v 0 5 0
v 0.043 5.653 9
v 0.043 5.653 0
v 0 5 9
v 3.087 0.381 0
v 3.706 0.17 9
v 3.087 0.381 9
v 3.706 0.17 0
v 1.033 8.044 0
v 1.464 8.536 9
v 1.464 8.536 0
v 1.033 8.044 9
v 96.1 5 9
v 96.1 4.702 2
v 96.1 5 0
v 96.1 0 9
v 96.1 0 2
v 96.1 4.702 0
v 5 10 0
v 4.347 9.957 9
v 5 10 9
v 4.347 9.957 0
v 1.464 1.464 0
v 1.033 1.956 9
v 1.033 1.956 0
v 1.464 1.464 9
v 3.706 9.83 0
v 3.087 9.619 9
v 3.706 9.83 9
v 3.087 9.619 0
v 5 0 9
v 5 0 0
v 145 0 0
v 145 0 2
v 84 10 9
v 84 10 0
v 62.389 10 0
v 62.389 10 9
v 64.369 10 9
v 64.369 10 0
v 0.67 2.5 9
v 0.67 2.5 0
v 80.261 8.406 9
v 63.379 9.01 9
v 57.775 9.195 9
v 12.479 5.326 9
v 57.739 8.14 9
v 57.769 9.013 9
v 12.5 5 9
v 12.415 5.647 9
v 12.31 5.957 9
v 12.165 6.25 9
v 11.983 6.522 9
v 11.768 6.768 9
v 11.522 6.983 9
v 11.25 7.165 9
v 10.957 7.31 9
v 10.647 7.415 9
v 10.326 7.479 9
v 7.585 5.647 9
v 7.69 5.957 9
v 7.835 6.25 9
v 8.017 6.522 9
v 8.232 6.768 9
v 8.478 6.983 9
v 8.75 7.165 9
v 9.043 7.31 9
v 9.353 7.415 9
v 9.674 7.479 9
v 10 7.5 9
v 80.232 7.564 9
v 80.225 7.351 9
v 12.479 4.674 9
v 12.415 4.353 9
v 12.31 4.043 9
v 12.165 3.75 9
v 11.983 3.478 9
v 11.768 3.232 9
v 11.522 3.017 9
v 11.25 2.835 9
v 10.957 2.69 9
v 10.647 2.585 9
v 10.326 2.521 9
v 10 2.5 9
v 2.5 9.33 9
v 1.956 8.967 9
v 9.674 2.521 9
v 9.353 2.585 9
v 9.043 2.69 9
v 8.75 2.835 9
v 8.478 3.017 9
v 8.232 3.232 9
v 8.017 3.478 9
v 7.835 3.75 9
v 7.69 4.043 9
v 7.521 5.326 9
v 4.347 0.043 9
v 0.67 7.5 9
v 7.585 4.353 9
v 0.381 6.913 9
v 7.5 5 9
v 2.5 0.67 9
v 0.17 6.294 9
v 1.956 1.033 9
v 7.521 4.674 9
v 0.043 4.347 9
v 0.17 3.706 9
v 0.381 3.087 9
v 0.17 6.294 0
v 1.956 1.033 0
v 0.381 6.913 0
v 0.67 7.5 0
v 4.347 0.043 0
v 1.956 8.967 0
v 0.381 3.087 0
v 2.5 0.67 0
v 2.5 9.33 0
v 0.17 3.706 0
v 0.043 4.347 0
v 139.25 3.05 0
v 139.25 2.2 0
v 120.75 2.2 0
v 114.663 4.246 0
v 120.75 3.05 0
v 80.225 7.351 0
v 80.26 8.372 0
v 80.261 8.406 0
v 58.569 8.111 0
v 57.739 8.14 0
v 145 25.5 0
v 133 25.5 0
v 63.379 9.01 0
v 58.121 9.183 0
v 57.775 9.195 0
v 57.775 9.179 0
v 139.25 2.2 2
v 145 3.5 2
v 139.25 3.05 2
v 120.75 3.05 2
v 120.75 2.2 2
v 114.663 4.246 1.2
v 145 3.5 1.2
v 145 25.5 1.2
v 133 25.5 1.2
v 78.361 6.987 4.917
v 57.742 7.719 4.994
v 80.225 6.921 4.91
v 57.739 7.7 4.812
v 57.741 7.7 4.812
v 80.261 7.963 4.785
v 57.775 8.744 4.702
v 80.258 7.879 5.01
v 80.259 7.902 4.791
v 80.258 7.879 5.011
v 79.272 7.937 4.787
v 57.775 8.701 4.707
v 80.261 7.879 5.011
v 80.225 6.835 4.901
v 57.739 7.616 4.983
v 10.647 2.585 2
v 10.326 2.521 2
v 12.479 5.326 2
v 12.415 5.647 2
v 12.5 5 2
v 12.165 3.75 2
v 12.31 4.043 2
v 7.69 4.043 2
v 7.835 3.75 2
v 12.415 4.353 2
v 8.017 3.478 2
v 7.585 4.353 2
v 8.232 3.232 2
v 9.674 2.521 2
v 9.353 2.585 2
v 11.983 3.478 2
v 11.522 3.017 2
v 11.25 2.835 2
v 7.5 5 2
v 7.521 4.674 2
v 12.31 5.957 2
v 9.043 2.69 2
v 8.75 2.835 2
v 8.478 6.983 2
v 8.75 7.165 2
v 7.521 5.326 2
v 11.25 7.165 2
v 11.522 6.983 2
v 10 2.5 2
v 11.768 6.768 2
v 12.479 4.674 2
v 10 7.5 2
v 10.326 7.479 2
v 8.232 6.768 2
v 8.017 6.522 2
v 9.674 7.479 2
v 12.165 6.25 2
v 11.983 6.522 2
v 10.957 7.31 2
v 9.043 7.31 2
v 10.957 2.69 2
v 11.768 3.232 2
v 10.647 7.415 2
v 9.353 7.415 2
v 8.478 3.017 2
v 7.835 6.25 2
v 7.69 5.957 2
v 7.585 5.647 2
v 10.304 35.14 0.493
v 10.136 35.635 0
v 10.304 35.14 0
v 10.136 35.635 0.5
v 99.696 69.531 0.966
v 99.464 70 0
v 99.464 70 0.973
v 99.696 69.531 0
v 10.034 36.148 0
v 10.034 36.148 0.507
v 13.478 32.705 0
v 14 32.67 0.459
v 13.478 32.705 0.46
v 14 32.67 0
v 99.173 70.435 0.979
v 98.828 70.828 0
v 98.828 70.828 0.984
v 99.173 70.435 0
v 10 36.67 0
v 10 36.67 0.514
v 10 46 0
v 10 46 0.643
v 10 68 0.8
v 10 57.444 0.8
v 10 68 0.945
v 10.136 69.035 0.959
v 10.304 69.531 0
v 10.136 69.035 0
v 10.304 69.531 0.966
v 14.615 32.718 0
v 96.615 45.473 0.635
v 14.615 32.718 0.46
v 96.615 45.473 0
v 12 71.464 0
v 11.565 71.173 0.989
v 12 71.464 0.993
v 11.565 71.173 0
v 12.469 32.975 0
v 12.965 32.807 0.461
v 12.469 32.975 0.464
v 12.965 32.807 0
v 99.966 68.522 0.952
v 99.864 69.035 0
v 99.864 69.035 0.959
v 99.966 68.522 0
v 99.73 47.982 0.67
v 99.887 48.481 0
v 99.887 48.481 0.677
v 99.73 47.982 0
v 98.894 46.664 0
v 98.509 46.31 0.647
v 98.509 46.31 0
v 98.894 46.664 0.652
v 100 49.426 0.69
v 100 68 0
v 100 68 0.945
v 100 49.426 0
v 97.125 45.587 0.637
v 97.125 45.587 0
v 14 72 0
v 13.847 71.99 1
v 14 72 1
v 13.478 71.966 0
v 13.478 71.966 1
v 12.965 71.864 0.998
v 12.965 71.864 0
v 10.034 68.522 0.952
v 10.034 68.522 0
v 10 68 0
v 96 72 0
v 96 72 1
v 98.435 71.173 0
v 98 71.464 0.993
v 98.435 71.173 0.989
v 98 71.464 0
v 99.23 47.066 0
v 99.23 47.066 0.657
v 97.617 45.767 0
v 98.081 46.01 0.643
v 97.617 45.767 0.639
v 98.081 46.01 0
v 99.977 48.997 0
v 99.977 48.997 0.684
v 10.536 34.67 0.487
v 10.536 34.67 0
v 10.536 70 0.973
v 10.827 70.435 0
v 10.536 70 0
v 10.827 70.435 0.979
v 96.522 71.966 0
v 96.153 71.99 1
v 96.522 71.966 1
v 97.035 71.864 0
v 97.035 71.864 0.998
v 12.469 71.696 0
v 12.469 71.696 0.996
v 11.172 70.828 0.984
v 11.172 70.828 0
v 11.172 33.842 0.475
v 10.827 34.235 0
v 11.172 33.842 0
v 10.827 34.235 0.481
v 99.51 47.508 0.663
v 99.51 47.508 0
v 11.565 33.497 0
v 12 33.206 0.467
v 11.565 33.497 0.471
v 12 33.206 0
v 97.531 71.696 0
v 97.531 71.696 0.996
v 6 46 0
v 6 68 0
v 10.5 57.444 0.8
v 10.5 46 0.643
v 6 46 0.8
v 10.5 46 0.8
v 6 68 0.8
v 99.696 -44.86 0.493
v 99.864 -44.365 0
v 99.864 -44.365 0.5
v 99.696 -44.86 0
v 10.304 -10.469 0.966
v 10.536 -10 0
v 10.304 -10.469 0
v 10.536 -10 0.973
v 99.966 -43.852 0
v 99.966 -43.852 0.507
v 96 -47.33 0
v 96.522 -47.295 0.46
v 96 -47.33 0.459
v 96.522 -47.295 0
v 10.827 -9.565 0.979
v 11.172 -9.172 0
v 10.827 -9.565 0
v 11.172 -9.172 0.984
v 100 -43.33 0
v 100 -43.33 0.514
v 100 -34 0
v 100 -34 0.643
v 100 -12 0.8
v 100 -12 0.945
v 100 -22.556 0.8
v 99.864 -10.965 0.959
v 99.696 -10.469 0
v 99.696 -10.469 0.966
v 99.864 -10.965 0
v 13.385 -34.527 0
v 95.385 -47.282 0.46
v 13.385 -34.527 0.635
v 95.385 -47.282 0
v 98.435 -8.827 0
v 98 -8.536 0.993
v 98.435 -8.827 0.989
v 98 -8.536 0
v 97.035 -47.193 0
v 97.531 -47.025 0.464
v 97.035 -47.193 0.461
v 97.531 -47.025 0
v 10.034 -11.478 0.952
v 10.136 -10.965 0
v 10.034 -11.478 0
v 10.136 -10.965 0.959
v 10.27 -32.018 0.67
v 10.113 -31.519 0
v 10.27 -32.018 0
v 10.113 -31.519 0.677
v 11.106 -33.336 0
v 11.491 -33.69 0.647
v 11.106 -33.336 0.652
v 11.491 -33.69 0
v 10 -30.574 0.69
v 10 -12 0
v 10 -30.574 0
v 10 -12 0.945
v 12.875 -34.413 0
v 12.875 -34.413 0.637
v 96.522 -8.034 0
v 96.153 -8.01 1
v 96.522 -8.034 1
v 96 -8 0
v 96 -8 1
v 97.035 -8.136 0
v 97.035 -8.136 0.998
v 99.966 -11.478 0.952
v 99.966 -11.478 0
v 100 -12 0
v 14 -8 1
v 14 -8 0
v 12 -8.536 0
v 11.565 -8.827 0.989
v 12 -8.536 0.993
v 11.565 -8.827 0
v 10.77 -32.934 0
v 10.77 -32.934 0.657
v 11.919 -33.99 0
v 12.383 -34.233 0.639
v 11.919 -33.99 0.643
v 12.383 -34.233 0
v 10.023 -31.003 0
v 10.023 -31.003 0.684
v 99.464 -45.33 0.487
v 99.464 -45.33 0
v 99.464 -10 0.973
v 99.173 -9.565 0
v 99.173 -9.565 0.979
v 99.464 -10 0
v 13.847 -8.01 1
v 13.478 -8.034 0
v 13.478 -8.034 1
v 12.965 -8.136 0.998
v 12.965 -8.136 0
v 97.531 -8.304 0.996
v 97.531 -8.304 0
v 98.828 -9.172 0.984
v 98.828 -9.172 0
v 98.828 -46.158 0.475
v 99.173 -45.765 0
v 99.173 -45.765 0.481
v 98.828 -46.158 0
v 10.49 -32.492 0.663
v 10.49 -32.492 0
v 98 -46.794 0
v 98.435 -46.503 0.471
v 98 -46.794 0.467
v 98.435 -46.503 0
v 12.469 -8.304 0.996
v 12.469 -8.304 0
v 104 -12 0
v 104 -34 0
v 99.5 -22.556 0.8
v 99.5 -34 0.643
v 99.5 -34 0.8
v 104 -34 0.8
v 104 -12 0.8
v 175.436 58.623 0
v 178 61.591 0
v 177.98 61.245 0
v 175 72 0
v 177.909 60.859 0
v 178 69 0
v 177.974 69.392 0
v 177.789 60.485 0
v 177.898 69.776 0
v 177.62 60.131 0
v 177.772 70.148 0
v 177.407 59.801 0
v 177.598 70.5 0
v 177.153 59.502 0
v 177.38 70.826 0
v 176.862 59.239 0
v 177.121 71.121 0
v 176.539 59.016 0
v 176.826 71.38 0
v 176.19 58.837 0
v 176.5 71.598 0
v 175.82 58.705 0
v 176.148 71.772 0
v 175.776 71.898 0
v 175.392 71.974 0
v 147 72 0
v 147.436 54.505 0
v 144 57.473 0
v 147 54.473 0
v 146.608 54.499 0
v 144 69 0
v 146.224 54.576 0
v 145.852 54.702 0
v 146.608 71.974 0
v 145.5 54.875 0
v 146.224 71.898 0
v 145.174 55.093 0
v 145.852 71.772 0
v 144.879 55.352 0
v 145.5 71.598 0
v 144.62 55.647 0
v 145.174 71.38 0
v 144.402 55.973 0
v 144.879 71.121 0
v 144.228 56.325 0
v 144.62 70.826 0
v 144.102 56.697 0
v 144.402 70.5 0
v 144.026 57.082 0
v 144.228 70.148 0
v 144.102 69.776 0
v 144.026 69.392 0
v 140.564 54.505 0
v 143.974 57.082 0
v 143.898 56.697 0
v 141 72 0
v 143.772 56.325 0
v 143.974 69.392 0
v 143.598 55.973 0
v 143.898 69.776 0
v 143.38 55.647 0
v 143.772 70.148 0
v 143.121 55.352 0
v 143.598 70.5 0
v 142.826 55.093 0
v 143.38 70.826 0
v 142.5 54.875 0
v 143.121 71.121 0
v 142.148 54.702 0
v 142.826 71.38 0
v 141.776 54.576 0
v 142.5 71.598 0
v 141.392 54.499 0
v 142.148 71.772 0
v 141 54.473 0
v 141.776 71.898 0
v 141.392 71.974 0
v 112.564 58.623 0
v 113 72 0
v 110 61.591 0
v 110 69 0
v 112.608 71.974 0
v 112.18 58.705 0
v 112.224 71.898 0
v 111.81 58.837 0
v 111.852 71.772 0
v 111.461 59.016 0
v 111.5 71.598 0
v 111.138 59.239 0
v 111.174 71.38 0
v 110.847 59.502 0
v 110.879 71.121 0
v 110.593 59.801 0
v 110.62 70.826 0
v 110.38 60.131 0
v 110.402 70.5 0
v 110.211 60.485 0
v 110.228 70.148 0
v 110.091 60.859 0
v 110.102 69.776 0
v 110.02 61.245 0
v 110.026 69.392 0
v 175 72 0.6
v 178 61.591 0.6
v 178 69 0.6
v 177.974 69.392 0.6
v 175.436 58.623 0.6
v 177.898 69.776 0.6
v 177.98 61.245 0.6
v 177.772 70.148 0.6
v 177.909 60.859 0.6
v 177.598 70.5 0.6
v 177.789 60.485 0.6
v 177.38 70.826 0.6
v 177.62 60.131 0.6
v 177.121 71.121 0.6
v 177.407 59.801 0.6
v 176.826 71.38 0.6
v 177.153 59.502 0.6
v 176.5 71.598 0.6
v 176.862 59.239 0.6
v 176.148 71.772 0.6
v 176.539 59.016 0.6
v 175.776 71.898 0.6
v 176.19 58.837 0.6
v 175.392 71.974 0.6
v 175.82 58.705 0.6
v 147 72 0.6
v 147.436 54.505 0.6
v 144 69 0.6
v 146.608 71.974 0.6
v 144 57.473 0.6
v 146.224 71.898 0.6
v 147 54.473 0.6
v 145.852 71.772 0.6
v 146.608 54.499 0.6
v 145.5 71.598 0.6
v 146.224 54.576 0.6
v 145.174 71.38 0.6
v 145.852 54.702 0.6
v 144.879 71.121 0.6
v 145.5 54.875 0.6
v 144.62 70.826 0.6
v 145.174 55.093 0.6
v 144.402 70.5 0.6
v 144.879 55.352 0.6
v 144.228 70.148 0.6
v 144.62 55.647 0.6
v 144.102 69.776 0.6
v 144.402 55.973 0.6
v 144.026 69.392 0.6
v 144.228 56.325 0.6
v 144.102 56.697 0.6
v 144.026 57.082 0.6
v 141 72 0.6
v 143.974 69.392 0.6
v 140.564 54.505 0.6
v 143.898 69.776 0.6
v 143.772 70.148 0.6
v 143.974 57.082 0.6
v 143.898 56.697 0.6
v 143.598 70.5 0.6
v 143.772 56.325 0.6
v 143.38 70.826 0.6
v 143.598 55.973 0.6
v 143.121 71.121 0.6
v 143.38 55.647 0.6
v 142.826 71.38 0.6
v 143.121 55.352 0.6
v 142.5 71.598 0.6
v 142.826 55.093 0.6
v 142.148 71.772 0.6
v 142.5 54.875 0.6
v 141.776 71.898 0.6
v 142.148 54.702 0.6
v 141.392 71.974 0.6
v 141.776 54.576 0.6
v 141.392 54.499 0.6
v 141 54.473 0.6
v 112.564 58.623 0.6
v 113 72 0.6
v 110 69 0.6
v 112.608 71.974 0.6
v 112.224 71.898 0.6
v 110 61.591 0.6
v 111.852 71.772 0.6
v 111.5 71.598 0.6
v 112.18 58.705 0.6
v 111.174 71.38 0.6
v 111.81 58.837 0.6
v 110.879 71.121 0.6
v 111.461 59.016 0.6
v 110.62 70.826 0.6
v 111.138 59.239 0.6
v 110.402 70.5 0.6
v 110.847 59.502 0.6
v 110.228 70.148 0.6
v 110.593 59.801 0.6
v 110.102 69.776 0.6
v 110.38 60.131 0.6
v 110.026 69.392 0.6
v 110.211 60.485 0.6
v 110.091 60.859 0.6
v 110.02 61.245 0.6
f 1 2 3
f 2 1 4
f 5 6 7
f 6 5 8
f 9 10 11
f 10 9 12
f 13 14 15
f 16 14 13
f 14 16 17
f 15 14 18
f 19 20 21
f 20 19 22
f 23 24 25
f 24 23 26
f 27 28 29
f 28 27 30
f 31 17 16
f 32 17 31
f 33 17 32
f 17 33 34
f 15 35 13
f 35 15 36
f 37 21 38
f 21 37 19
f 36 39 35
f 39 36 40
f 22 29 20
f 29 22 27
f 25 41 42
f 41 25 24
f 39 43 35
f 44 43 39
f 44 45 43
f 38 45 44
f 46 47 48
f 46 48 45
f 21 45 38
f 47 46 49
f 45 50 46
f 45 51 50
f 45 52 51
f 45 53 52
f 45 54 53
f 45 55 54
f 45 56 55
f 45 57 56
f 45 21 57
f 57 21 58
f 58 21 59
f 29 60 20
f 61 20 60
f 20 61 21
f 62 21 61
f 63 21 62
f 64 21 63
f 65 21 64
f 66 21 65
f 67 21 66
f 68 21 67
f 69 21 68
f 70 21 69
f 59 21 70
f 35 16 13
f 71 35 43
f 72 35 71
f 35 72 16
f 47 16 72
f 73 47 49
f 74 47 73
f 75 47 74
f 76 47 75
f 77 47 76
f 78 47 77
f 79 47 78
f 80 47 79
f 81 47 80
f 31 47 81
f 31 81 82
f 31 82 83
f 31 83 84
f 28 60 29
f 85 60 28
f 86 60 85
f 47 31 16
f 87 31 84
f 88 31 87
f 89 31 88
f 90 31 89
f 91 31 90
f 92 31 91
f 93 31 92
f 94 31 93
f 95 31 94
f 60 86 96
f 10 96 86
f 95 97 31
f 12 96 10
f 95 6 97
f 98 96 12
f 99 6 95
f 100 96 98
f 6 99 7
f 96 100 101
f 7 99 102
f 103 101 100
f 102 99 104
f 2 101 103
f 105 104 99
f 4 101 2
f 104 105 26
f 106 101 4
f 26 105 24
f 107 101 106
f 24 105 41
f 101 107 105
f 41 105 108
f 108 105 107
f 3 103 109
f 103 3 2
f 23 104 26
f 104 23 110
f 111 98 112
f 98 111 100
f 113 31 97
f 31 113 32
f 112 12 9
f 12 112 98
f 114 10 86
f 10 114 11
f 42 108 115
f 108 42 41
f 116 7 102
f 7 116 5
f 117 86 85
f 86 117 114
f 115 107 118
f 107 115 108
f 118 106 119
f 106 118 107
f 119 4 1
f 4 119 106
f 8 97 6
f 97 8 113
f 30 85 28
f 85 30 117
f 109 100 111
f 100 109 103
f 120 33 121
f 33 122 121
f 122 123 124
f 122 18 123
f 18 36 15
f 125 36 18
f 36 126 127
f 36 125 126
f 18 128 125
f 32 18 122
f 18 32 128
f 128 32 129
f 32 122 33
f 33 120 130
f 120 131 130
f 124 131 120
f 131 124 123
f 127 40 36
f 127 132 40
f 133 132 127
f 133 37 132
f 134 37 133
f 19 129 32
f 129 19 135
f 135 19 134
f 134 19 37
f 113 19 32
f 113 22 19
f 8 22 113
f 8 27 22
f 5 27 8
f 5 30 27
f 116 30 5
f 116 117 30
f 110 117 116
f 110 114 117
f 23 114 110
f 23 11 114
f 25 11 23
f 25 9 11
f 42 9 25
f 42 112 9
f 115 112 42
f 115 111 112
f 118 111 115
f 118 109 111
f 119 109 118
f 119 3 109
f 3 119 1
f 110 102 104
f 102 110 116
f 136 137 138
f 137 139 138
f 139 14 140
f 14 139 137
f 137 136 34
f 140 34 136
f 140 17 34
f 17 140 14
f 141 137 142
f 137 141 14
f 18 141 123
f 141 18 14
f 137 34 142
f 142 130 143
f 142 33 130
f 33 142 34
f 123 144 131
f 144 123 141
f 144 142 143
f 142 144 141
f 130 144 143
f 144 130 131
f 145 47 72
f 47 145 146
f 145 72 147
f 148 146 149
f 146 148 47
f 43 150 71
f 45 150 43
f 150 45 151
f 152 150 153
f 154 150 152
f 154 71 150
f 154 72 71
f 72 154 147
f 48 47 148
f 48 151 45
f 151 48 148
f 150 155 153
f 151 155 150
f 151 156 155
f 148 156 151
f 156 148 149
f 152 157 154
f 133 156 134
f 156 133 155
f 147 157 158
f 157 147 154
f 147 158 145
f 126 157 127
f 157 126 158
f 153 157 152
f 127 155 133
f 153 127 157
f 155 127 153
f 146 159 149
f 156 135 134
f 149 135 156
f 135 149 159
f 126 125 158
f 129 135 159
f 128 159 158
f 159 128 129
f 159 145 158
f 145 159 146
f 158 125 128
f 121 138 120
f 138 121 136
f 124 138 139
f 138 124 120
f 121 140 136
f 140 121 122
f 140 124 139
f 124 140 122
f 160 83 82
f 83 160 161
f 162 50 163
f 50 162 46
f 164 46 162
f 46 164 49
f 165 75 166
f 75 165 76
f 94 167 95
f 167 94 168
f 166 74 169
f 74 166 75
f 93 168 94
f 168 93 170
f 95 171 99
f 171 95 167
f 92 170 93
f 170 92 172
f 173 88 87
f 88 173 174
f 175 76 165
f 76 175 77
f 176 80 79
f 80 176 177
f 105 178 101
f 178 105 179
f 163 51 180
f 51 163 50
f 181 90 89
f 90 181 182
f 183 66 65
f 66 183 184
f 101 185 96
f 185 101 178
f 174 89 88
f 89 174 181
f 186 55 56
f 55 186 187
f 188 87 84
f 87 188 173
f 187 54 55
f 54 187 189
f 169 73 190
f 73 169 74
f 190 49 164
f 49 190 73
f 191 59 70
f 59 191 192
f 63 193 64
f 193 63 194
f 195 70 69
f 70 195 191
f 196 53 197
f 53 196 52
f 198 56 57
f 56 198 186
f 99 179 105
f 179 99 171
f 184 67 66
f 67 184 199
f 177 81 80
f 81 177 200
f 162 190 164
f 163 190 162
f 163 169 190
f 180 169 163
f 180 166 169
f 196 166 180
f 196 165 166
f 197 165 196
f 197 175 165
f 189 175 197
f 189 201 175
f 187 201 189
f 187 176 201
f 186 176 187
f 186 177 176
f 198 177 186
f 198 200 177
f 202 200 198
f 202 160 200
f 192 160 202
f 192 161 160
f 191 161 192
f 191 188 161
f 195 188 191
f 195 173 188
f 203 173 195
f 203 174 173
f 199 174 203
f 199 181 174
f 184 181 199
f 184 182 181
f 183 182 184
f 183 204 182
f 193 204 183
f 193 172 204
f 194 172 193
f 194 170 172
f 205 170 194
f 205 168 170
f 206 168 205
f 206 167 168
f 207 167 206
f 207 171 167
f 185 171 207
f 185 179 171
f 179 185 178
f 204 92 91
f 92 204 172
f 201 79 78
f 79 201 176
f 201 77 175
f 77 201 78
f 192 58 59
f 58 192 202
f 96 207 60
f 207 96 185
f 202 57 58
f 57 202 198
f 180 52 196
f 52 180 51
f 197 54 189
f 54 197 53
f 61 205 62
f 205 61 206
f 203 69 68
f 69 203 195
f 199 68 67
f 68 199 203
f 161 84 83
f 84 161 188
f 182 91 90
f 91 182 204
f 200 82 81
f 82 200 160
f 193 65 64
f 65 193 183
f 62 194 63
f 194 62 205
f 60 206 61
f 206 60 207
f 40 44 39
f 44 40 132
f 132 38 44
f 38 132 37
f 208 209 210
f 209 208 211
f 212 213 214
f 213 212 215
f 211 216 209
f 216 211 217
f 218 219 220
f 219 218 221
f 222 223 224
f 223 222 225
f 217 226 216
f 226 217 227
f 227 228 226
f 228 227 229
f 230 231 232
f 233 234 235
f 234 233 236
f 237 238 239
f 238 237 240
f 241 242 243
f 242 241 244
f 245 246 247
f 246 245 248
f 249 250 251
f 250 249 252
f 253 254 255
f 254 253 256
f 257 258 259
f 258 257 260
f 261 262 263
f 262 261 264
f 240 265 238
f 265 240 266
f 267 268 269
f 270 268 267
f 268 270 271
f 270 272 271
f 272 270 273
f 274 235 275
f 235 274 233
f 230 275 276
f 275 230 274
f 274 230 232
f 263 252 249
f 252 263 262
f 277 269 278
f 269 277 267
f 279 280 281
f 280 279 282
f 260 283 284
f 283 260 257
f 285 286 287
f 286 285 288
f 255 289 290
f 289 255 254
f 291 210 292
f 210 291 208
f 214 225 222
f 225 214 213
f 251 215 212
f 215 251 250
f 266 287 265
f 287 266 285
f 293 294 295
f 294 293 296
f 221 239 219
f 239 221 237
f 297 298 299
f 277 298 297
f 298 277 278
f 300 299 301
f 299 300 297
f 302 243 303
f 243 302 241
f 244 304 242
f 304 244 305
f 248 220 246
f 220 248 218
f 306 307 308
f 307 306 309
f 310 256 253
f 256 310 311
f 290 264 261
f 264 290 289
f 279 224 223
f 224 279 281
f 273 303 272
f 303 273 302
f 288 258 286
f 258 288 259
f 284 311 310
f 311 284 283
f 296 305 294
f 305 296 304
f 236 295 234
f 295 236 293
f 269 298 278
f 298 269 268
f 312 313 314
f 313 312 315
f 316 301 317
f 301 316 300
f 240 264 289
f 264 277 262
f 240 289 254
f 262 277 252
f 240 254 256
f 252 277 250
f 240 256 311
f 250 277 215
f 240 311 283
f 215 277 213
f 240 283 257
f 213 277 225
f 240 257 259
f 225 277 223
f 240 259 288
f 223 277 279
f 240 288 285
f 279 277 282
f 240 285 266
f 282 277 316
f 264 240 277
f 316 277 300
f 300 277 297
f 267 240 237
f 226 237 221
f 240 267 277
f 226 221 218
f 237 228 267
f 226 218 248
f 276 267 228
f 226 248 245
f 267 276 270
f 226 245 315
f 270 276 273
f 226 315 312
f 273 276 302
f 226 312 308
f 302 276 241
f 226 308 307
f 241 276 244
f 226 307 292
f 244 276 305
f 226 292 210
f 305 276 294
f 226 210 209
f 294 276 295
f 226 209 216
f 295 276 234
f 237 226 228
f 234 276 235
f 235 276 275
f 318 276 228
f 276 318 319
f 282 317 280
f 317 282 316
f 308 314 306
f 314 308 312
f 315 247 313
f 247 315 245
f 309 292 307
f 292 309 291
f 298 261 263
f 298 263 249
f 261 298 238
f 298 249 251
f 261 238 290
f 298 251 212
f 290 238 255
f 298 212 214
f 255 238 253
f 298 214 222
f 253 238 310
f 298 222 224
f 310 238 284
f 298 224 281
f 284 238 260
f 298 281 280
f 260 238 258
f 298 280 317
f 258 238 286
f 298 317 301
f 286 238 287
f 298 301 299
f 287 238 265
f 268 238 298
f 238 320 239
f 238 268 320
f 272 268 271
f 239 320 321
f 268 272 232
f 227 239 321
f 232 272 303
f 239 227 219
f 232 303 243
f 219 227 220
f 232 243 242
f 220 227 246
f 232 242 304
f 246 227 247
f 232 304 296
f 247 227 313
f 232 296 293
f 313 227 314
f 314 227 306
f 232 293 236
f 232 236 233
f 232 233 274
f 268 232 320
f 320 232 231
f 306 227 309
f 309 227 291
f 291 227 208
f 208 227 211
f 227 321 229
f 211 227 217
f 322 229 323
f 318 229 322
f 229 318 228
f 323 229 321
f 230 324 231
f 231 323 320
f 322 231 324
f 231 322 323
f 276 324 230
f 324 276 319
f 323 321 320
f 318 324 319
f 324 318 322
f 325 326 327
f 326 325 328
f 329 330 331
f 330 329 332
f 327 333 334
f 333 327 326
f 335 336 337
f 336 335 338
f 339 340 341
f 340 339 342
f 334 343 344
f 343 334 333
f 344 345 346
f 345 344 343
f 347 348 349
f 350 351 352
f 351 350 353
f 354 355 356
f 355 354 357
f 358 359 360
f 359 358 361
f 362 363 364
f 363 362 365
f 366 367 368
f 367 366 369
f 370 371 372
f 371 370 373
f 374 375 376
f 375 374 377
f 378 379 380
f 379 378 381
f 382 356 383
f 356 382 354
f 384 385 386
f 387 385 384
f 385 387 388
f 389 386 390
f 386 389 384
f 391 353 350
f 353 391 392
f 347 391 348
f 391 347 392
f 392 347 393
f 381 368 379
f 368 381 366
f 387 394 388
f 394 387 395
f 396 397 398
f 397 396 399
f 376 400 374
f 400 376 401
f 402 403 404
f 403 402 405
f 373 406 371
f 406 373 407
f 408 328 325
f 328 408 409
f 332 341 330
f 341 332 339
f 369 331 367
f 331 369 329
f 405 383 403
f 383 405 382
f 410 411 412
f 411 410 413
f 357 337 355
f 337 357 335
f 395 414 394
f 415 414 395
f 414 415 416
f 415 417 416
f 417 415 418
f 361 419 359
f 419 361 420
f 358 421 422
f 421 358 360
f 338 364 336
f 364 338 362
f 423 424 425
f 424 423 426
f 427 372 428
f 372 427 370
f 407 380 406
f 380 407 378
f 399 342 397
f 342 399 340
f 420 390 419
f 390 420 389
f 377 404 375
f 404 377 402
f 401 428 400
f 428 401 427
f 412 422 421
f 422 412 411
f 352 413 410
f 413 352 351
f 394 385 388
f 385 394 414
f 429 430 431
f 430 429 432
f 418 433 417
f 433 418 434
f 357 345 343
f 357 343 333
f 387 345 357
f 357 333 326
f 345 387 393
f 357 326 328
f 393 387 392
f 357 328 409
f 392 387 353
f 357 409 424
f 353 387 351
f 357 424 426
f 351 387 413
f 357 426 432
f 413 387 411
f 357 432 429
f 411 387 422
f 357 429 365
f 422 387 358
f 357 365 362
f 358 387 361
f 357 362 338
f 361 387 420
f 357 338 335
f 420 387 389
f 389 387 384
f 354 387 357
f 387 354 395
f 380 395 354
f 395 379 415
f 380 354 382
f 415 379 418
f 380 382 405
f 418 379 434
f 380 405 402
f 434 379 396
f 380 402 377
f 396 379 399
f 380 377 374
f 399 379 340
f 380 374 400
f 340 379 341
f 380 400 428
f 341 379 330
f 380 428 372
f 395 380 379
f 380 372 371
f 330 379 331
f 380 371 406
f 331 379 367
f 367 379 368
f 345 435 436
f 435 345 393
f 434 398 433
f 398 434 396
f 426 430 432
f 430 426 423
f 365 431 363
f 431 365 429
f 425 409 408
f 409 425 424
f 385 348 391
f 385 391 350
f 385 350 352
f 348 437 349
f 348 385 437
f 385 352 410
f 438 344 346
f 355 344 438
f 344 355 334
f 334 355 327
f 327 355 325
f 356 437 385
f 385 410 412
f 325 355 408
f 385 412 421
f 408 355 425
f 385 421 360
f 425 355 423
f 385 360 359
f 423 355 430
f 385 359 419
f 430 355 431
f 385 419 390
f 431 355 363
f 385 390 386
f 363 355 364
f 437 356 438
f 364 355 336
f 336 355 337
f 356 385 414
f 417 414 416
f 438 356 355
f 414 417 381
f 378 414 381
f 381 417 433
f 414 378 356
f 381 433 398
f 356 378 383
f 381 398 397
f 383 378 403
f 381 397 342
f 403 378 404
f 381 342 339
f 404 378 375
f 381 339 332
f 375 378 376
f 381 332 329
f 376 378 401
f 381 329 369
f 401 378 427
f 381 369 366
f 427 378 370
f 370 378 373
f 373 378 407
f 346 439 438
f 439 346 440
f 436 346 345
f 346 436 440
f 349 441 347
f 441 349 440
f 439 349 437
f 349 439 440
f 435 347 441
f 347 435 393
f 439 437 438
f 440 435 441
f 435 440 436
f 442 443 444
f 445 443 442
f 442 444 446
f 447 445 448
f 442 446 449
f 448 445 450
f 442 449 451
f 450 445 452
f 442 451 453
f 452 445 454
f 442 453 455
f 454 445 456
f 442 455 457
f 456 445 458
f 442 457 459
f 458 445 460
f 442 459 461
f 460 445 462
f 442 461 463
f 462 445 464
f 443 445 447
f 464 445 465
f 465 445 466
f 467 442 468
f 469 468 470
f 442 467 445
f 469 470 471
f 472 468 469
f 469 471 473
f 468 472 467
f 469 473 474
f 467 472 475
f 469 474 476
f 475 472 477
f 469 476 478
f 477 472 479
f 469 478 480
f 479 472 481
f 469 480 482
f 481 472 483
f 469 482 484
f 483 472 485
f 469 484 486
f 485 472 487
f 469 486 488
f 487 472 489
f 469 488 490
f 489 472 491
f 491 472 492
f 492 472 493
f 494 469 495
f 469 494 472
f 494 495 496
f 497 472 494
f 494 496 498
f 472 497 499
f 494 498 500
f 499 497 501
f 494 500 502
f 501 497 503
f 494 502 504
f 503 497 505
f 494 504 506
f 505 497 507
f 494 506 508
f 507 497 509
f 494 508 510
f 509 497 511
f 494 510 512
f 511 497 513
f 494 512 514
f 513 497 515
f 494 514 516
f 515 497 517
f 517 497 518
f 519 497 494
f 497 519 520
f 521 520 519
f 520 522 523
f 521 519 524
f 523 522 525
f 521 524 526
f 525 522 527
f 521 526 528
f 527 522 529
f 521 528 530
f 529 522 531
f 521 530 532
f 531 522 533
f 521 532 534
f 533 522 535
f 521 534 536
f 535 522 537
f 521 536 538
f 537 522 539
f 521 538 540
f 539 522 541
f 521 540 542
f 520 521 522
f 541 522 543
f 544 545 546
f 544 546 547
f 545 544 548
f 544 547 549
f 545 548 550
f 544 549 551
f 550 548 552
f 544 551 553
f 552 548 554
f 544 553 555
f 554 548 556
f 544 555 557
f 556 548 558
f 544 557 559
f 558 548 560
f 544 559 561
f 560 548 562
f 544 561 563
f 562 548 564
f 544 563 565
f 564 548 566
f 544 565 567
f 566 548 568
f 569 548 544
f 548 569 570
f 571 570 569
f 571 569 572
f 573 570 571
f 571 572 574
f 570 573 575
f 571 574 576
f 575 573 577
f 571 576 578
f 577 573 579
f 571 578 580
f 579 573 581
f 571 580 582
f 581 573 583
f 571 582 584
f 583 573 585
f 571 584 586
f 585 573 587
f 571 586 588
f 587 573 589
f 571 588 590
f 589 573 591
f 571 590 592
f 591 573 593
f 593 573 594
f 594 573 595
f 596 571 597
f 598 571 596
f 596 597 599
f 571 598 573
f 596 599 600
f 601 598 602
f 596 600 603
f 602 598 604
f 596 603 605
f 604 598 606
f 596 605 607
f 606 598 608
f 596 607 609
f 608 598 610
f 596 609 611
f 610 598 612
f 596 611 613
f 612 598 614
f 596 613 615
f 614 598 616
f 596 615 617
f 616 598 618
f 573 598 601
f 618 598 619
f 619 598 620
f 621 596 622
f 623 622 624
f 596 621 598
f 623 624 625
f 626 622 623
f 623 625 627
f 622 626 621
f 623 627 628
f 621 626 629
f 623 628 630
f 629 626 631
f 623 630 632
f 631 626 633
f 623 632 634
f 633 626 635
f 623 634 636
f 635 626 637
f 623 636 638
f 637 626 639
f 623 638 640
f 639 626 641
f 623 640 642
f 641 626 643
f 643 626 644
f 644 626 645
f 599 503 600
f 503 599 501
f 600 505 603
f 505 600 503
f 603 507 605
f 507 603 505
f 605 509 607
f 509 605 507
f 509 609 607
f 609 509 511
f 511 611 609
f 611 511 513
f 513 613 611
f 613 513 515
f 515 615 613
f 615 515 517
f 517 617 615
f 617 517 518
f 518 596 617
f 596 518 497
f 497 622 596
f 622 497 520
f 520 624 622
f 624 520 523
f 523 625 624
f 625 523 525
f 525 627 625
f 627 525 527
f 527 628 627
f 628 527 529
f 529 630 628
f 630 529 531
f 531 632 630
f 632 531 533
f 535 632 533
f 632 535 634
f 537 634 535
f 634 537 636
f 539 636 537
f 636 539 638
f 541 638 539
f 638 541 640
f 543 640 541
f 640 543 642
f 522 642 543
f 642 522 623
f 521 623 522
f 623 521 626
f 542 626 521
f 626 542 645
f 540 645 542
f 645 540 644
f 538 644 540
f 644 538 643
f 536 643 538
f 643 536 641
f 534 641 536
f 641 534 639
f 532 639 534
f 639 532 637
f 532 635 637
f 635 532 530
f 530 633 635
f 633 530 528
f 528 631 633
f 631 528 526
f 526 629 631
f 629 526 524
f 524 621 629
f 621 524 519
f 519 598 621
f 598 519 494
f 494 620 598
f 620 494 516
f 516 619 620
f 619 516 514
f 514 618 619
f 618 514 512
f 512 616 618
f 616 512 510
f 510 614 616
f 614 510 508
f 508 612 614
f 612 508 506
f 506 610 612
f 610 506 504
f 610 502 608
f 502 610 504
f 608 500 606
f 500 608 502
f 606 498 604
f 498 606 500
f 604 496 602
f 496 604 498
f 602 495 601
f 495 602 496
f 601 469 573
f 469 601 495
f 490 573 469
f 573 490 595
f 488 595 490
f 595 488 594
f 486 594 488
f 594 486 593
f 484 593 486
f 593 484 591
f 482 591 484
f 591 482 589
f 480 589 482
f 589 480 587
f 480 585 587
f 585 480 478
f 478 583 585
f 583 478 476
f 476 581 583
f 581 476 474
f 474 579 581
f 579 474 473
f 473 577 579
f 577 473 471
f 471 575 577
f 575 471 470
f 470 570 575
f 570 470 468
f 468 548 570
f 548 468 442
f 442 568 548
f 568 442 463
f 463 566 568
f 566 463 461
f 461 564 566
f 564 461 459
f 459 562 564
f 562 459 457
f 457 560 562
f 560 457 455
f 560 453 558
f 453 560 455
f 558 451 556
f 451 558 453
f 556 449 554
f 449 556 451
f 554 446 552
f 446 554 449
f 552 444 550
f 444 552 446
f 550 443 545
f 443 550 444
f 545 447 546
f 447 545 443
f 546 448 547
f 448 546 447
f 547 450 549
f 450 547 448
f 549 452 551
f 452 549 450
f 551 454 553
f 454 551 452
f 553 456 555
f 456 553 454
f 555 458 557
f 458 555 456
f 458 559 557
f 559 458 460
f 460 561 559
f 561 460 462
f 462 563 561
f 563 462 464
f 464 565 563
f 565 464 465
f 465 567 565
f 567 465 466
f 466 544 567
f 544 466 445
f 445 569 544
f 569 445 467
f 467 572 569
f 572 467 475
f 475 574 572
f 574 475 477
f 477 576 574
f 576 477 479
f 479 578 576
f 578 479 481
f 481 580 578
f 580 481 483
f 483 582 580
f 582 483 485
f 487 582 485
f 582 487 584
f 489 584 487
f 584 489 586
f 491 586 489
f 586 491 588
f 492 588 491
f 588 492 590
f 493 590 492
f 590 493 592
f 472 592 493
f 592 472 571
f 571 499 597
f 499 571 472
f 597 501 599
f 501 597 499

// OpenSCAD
// Tiny chuck glider.
//
// Four printed parts, no glue required:
//   * fuselage  - modelled upright, printed lying on its right side so the
//                 slot widths are drawn in-plane (accurate) rather than
//                 bridged. Two angled slots for the wing halves (dihedral +
//                 incidence), a through-slot for the tailplane, a nose
//                 ballast pocket and a CG notch on top.
//   * wing x2   - flat-bottomed wedge plates, printed flat. Root tab plugs
//                 into the fuselage. Left half is a mirror of the right.
//   * tailplane - flat plate, slides through the boom.
//
// Set `part` to "plate" for the print layout, "assembled" to check the model,
// or one of "fuselage" / "wing_r" / "wing_l" / "tail" for individual exports.
part = "plate";

// ---- Wing -----------------------------------------------------------------
half_span   = 90;      // per side, excluding the root tab
root_chord  = 40;
tip_chord   = 26;
tip_round   = 4;       // corner radius at the tip
t_le        = 1.0;     // wing thickness at the leading edge
t_te        = 0.45;     // ... at the trailing edge (wedge section)
tab_len     = 4.0;     // root tab that goes into the fuselage (per side)
tab_x0      = 4;       // tab runs from this chord station ...
tab_x1      = 26;      // ... to this one
tab_t       = 0.8;     // tab thickness
dihedral    = 6;       // degrees per side
incidence   = 2;       // wing angle relative to fuselage, degrees (LE up)
slot_clear  = 0.25;    // extra slot thickness / length for a push fit

// ---- Fuselage -------------------------------------------------------------
x_le        = 54;      // wing leading edge position from the nose
pod_len     = 84;      // solid nose pod, nose to where it starts tapering
pod_w       = 9;
pod_h       = 10;
boom_w      = 2.0;
boom_h0     = 5;       // boom height where it leaves the pod
boom_h1     = 3.5;       // boom height at the tail
fus_len     = 145;
wing_z      = 7.8;     // height of the wing slot centre line above the bottom
ballast_d   = 5;       // nose pocket diameter (BBs / screw / clay for trimming), enters from the left side
ballast_x   = 10;
ballast_depth = 7;

// ---- Tail -----------------------------------------------------------------
tail_span   = 68;
tail_root   = 18;
tail_tip    = 13;
tail_t      = 0.6;
tail_x      = fus_len - 24;   // tailplane leading edge position
fin_h       = 22;             // above the boom
fin_w       = 1.2;

// ---- Derived --------------------------------------------------------------
boom_y  = pod_w / 2 - boom_w / 2;       // boom centre line (flush with the right side)
lambda  = tip_chord / root_chord;
mac     = 2 / 3 * root_chord * (1 + lambda + lambda * lambda) / (1 + lambda);
cg_frac = 0.28;
x_cg    = x_le + cg_frac * mac;         // where the CG should end up
echo(str("MAC = ", mac, " mm, target CG at x = ", x_cg, " mm from the nose"));

$fn = 48;

// ---------------------------------------------------------------------------
module rounded_planform(root, tip, span, r) {
    // Straight leading edge along y, tapering trailing edge, rounded tip.
    offset(r = r) offset(delta = -r)
        polygon([[0, 0], [root, 0], [tip, span], [0, span]]);
}

// Right wing half, flat side down, root at y = 0, LE at x = 0.
module wing_half() {
    // wedge section: thick at the LE, thin at the TE, over the root chord
    intersection() {
        linear_extrude(t_le) rounded_planform(root_chord, tip_chord, half_span, tip_round);
        hull() {
            cube([0.01, half_span + 1, t_le]);
            translate([root_chord, 0, 0]) cube([0.01, half_span + 1, t_te]);
        }
    }
    // root tab
    translate([tab_x0, -tab_len, 0]) cube([tab_x1 - tab_x0, tab_len + 0.5, tab_t]);
}

module tailplane() {
    linear_extrude(tail_t)
        translate([0, tail_span / 2])
            union() {
                rounded_planform(tail_root, tail_tip, tail_span / 2, 3);
                mirror([0, 1]) rounded_planform(tail_root, tail_tip, tail_span / 2, 3);
            }
}

// Transform that places the right wing half onto the fuselage.
module place_wing(side = 1) {
    // pivot: middle of the tab, on the fuselage centre line, at wing height
    translate([x_le + (tab_x0 + tab_x1) / 2, 0, wing_z])
        rotate([side * dihedral, 0, 0]) rotate([0, incidence, 0])
            translate([-(tab_x0 + tab_x1) / 2, 0, -tab_t / 2])
                children();
}

module fuselage() {
    difference() {
        union() {
            // pod: rounded nose, flat bottom, tapering into the boom
            rotate([90, 0, 0]) linear_extrude(pod_w, center = true)
                hull() {
                    translate([pod_h / 2, pod_h / 2]) circle(pod_h / 2);
                    translate([pod_h / 2, 0]) square([pod_len - pod_h / 2, pod_h]);
                    translate([pod_len + 12, 0]) square([0.1, boom_h0]);
                }
            // boom and fin, flush with the right side of the pod (the side that
            // lies on the build plate) so nothing floats when printed
            translate([0, boom_y, 0]) rotate([90, 0, 0]) linear_extrude(boom_w, center = true)
                polygon([[pod_len, 0], [fus_len, 0], [fus_len, boom_h1], [pod_len, boom_h0]]);
            translate([0, pod_w / 2 - fin_w / 2, 0]) rotate([90, 0, 0]) linear_extrude(fin_w, center = true)
                polygon([[fus_len - 34, 0], [fus_len, 0], [fus_len, boom_h1 + fin_h],
                         [fus_len - 12, boom_h1 + fin_h]]);
        }
        // wing slots (angled for dihedral and incidence)
        for (side = [-1, 1])
            place_wing(side)
                translate([tab_x0 - slot_clear, side > 0 ? -0.5 : -pod_w / 2 - 1, -slot_clear / 2])
                    cube([tab_x1 - tab_x0 + 2 * slot_clear, pod_w / 2 + 0.5 + 1 - 0.8, tab_t + slot_clear]);
        // tailplane slot
        translate([tail_x - slot_clear, -5, 2.2])
            cube([tail_root + 2 * slot_clear, 10, tail_t + slot_clear]);
        // ballast pocket: blind hole from the left side (the top face when printed)
        translate([ballast_x, -pod_w / 2 + ballast_depth, pod_h / 2]) rotate([90, 0, 0])
            cylinder(d = ballast_d, h = 20);
        // CG notch on top of the pod
        translate([x_cg, 0, pod_h]) rotate([0, 45, 0]) cube([1.4, pod_w + 2, 1.4], center = true);
    }
}

module assembled() {
    fuselage();
    place_wing( 1) wing_half();
    place_wing(-1) mirror([0, 1, 0]) wing_half();
    translate([tail_x, boom_y - tail_span / 2, 2.2 + slot_clear / 2]) tailplane();
}

// Fuselage in its print orientation: lying on its right side, fin flat.
module fuselage_print() {
    translate([0, 0, pod_w / 2]) rotate([-90, 0, 0]) fuselage();
}

module plate() {
    // Everything spanwise along X so the whole set fits in ~180 x 120 mm.
    fuselage_print();                                                            // y 0..25.5
    translate([10, 72, 0])   rotate([0, 0, -90]) wing_half();                   // right wing, y 32..72
    translate([100, -8, 0])  rotate([0, 0, -90]) mirror([0, 1, 0]) wing_half(); // left wing, y -48..-8
    translate([110, 72, 0])  rotate([0, 0, -90]) tailplane();                   // y 54..72
}

if (part == "plate")          plate();
else if (part == "assembled") assembled();
else if (part == "fuselage")  fuselage_print();
else if (part == "wing_r")    wing_half();
else if (part == "wing_l")    mirror([0, 1, 0]) wing_half();
else if (part == "tail")      tailplane();
